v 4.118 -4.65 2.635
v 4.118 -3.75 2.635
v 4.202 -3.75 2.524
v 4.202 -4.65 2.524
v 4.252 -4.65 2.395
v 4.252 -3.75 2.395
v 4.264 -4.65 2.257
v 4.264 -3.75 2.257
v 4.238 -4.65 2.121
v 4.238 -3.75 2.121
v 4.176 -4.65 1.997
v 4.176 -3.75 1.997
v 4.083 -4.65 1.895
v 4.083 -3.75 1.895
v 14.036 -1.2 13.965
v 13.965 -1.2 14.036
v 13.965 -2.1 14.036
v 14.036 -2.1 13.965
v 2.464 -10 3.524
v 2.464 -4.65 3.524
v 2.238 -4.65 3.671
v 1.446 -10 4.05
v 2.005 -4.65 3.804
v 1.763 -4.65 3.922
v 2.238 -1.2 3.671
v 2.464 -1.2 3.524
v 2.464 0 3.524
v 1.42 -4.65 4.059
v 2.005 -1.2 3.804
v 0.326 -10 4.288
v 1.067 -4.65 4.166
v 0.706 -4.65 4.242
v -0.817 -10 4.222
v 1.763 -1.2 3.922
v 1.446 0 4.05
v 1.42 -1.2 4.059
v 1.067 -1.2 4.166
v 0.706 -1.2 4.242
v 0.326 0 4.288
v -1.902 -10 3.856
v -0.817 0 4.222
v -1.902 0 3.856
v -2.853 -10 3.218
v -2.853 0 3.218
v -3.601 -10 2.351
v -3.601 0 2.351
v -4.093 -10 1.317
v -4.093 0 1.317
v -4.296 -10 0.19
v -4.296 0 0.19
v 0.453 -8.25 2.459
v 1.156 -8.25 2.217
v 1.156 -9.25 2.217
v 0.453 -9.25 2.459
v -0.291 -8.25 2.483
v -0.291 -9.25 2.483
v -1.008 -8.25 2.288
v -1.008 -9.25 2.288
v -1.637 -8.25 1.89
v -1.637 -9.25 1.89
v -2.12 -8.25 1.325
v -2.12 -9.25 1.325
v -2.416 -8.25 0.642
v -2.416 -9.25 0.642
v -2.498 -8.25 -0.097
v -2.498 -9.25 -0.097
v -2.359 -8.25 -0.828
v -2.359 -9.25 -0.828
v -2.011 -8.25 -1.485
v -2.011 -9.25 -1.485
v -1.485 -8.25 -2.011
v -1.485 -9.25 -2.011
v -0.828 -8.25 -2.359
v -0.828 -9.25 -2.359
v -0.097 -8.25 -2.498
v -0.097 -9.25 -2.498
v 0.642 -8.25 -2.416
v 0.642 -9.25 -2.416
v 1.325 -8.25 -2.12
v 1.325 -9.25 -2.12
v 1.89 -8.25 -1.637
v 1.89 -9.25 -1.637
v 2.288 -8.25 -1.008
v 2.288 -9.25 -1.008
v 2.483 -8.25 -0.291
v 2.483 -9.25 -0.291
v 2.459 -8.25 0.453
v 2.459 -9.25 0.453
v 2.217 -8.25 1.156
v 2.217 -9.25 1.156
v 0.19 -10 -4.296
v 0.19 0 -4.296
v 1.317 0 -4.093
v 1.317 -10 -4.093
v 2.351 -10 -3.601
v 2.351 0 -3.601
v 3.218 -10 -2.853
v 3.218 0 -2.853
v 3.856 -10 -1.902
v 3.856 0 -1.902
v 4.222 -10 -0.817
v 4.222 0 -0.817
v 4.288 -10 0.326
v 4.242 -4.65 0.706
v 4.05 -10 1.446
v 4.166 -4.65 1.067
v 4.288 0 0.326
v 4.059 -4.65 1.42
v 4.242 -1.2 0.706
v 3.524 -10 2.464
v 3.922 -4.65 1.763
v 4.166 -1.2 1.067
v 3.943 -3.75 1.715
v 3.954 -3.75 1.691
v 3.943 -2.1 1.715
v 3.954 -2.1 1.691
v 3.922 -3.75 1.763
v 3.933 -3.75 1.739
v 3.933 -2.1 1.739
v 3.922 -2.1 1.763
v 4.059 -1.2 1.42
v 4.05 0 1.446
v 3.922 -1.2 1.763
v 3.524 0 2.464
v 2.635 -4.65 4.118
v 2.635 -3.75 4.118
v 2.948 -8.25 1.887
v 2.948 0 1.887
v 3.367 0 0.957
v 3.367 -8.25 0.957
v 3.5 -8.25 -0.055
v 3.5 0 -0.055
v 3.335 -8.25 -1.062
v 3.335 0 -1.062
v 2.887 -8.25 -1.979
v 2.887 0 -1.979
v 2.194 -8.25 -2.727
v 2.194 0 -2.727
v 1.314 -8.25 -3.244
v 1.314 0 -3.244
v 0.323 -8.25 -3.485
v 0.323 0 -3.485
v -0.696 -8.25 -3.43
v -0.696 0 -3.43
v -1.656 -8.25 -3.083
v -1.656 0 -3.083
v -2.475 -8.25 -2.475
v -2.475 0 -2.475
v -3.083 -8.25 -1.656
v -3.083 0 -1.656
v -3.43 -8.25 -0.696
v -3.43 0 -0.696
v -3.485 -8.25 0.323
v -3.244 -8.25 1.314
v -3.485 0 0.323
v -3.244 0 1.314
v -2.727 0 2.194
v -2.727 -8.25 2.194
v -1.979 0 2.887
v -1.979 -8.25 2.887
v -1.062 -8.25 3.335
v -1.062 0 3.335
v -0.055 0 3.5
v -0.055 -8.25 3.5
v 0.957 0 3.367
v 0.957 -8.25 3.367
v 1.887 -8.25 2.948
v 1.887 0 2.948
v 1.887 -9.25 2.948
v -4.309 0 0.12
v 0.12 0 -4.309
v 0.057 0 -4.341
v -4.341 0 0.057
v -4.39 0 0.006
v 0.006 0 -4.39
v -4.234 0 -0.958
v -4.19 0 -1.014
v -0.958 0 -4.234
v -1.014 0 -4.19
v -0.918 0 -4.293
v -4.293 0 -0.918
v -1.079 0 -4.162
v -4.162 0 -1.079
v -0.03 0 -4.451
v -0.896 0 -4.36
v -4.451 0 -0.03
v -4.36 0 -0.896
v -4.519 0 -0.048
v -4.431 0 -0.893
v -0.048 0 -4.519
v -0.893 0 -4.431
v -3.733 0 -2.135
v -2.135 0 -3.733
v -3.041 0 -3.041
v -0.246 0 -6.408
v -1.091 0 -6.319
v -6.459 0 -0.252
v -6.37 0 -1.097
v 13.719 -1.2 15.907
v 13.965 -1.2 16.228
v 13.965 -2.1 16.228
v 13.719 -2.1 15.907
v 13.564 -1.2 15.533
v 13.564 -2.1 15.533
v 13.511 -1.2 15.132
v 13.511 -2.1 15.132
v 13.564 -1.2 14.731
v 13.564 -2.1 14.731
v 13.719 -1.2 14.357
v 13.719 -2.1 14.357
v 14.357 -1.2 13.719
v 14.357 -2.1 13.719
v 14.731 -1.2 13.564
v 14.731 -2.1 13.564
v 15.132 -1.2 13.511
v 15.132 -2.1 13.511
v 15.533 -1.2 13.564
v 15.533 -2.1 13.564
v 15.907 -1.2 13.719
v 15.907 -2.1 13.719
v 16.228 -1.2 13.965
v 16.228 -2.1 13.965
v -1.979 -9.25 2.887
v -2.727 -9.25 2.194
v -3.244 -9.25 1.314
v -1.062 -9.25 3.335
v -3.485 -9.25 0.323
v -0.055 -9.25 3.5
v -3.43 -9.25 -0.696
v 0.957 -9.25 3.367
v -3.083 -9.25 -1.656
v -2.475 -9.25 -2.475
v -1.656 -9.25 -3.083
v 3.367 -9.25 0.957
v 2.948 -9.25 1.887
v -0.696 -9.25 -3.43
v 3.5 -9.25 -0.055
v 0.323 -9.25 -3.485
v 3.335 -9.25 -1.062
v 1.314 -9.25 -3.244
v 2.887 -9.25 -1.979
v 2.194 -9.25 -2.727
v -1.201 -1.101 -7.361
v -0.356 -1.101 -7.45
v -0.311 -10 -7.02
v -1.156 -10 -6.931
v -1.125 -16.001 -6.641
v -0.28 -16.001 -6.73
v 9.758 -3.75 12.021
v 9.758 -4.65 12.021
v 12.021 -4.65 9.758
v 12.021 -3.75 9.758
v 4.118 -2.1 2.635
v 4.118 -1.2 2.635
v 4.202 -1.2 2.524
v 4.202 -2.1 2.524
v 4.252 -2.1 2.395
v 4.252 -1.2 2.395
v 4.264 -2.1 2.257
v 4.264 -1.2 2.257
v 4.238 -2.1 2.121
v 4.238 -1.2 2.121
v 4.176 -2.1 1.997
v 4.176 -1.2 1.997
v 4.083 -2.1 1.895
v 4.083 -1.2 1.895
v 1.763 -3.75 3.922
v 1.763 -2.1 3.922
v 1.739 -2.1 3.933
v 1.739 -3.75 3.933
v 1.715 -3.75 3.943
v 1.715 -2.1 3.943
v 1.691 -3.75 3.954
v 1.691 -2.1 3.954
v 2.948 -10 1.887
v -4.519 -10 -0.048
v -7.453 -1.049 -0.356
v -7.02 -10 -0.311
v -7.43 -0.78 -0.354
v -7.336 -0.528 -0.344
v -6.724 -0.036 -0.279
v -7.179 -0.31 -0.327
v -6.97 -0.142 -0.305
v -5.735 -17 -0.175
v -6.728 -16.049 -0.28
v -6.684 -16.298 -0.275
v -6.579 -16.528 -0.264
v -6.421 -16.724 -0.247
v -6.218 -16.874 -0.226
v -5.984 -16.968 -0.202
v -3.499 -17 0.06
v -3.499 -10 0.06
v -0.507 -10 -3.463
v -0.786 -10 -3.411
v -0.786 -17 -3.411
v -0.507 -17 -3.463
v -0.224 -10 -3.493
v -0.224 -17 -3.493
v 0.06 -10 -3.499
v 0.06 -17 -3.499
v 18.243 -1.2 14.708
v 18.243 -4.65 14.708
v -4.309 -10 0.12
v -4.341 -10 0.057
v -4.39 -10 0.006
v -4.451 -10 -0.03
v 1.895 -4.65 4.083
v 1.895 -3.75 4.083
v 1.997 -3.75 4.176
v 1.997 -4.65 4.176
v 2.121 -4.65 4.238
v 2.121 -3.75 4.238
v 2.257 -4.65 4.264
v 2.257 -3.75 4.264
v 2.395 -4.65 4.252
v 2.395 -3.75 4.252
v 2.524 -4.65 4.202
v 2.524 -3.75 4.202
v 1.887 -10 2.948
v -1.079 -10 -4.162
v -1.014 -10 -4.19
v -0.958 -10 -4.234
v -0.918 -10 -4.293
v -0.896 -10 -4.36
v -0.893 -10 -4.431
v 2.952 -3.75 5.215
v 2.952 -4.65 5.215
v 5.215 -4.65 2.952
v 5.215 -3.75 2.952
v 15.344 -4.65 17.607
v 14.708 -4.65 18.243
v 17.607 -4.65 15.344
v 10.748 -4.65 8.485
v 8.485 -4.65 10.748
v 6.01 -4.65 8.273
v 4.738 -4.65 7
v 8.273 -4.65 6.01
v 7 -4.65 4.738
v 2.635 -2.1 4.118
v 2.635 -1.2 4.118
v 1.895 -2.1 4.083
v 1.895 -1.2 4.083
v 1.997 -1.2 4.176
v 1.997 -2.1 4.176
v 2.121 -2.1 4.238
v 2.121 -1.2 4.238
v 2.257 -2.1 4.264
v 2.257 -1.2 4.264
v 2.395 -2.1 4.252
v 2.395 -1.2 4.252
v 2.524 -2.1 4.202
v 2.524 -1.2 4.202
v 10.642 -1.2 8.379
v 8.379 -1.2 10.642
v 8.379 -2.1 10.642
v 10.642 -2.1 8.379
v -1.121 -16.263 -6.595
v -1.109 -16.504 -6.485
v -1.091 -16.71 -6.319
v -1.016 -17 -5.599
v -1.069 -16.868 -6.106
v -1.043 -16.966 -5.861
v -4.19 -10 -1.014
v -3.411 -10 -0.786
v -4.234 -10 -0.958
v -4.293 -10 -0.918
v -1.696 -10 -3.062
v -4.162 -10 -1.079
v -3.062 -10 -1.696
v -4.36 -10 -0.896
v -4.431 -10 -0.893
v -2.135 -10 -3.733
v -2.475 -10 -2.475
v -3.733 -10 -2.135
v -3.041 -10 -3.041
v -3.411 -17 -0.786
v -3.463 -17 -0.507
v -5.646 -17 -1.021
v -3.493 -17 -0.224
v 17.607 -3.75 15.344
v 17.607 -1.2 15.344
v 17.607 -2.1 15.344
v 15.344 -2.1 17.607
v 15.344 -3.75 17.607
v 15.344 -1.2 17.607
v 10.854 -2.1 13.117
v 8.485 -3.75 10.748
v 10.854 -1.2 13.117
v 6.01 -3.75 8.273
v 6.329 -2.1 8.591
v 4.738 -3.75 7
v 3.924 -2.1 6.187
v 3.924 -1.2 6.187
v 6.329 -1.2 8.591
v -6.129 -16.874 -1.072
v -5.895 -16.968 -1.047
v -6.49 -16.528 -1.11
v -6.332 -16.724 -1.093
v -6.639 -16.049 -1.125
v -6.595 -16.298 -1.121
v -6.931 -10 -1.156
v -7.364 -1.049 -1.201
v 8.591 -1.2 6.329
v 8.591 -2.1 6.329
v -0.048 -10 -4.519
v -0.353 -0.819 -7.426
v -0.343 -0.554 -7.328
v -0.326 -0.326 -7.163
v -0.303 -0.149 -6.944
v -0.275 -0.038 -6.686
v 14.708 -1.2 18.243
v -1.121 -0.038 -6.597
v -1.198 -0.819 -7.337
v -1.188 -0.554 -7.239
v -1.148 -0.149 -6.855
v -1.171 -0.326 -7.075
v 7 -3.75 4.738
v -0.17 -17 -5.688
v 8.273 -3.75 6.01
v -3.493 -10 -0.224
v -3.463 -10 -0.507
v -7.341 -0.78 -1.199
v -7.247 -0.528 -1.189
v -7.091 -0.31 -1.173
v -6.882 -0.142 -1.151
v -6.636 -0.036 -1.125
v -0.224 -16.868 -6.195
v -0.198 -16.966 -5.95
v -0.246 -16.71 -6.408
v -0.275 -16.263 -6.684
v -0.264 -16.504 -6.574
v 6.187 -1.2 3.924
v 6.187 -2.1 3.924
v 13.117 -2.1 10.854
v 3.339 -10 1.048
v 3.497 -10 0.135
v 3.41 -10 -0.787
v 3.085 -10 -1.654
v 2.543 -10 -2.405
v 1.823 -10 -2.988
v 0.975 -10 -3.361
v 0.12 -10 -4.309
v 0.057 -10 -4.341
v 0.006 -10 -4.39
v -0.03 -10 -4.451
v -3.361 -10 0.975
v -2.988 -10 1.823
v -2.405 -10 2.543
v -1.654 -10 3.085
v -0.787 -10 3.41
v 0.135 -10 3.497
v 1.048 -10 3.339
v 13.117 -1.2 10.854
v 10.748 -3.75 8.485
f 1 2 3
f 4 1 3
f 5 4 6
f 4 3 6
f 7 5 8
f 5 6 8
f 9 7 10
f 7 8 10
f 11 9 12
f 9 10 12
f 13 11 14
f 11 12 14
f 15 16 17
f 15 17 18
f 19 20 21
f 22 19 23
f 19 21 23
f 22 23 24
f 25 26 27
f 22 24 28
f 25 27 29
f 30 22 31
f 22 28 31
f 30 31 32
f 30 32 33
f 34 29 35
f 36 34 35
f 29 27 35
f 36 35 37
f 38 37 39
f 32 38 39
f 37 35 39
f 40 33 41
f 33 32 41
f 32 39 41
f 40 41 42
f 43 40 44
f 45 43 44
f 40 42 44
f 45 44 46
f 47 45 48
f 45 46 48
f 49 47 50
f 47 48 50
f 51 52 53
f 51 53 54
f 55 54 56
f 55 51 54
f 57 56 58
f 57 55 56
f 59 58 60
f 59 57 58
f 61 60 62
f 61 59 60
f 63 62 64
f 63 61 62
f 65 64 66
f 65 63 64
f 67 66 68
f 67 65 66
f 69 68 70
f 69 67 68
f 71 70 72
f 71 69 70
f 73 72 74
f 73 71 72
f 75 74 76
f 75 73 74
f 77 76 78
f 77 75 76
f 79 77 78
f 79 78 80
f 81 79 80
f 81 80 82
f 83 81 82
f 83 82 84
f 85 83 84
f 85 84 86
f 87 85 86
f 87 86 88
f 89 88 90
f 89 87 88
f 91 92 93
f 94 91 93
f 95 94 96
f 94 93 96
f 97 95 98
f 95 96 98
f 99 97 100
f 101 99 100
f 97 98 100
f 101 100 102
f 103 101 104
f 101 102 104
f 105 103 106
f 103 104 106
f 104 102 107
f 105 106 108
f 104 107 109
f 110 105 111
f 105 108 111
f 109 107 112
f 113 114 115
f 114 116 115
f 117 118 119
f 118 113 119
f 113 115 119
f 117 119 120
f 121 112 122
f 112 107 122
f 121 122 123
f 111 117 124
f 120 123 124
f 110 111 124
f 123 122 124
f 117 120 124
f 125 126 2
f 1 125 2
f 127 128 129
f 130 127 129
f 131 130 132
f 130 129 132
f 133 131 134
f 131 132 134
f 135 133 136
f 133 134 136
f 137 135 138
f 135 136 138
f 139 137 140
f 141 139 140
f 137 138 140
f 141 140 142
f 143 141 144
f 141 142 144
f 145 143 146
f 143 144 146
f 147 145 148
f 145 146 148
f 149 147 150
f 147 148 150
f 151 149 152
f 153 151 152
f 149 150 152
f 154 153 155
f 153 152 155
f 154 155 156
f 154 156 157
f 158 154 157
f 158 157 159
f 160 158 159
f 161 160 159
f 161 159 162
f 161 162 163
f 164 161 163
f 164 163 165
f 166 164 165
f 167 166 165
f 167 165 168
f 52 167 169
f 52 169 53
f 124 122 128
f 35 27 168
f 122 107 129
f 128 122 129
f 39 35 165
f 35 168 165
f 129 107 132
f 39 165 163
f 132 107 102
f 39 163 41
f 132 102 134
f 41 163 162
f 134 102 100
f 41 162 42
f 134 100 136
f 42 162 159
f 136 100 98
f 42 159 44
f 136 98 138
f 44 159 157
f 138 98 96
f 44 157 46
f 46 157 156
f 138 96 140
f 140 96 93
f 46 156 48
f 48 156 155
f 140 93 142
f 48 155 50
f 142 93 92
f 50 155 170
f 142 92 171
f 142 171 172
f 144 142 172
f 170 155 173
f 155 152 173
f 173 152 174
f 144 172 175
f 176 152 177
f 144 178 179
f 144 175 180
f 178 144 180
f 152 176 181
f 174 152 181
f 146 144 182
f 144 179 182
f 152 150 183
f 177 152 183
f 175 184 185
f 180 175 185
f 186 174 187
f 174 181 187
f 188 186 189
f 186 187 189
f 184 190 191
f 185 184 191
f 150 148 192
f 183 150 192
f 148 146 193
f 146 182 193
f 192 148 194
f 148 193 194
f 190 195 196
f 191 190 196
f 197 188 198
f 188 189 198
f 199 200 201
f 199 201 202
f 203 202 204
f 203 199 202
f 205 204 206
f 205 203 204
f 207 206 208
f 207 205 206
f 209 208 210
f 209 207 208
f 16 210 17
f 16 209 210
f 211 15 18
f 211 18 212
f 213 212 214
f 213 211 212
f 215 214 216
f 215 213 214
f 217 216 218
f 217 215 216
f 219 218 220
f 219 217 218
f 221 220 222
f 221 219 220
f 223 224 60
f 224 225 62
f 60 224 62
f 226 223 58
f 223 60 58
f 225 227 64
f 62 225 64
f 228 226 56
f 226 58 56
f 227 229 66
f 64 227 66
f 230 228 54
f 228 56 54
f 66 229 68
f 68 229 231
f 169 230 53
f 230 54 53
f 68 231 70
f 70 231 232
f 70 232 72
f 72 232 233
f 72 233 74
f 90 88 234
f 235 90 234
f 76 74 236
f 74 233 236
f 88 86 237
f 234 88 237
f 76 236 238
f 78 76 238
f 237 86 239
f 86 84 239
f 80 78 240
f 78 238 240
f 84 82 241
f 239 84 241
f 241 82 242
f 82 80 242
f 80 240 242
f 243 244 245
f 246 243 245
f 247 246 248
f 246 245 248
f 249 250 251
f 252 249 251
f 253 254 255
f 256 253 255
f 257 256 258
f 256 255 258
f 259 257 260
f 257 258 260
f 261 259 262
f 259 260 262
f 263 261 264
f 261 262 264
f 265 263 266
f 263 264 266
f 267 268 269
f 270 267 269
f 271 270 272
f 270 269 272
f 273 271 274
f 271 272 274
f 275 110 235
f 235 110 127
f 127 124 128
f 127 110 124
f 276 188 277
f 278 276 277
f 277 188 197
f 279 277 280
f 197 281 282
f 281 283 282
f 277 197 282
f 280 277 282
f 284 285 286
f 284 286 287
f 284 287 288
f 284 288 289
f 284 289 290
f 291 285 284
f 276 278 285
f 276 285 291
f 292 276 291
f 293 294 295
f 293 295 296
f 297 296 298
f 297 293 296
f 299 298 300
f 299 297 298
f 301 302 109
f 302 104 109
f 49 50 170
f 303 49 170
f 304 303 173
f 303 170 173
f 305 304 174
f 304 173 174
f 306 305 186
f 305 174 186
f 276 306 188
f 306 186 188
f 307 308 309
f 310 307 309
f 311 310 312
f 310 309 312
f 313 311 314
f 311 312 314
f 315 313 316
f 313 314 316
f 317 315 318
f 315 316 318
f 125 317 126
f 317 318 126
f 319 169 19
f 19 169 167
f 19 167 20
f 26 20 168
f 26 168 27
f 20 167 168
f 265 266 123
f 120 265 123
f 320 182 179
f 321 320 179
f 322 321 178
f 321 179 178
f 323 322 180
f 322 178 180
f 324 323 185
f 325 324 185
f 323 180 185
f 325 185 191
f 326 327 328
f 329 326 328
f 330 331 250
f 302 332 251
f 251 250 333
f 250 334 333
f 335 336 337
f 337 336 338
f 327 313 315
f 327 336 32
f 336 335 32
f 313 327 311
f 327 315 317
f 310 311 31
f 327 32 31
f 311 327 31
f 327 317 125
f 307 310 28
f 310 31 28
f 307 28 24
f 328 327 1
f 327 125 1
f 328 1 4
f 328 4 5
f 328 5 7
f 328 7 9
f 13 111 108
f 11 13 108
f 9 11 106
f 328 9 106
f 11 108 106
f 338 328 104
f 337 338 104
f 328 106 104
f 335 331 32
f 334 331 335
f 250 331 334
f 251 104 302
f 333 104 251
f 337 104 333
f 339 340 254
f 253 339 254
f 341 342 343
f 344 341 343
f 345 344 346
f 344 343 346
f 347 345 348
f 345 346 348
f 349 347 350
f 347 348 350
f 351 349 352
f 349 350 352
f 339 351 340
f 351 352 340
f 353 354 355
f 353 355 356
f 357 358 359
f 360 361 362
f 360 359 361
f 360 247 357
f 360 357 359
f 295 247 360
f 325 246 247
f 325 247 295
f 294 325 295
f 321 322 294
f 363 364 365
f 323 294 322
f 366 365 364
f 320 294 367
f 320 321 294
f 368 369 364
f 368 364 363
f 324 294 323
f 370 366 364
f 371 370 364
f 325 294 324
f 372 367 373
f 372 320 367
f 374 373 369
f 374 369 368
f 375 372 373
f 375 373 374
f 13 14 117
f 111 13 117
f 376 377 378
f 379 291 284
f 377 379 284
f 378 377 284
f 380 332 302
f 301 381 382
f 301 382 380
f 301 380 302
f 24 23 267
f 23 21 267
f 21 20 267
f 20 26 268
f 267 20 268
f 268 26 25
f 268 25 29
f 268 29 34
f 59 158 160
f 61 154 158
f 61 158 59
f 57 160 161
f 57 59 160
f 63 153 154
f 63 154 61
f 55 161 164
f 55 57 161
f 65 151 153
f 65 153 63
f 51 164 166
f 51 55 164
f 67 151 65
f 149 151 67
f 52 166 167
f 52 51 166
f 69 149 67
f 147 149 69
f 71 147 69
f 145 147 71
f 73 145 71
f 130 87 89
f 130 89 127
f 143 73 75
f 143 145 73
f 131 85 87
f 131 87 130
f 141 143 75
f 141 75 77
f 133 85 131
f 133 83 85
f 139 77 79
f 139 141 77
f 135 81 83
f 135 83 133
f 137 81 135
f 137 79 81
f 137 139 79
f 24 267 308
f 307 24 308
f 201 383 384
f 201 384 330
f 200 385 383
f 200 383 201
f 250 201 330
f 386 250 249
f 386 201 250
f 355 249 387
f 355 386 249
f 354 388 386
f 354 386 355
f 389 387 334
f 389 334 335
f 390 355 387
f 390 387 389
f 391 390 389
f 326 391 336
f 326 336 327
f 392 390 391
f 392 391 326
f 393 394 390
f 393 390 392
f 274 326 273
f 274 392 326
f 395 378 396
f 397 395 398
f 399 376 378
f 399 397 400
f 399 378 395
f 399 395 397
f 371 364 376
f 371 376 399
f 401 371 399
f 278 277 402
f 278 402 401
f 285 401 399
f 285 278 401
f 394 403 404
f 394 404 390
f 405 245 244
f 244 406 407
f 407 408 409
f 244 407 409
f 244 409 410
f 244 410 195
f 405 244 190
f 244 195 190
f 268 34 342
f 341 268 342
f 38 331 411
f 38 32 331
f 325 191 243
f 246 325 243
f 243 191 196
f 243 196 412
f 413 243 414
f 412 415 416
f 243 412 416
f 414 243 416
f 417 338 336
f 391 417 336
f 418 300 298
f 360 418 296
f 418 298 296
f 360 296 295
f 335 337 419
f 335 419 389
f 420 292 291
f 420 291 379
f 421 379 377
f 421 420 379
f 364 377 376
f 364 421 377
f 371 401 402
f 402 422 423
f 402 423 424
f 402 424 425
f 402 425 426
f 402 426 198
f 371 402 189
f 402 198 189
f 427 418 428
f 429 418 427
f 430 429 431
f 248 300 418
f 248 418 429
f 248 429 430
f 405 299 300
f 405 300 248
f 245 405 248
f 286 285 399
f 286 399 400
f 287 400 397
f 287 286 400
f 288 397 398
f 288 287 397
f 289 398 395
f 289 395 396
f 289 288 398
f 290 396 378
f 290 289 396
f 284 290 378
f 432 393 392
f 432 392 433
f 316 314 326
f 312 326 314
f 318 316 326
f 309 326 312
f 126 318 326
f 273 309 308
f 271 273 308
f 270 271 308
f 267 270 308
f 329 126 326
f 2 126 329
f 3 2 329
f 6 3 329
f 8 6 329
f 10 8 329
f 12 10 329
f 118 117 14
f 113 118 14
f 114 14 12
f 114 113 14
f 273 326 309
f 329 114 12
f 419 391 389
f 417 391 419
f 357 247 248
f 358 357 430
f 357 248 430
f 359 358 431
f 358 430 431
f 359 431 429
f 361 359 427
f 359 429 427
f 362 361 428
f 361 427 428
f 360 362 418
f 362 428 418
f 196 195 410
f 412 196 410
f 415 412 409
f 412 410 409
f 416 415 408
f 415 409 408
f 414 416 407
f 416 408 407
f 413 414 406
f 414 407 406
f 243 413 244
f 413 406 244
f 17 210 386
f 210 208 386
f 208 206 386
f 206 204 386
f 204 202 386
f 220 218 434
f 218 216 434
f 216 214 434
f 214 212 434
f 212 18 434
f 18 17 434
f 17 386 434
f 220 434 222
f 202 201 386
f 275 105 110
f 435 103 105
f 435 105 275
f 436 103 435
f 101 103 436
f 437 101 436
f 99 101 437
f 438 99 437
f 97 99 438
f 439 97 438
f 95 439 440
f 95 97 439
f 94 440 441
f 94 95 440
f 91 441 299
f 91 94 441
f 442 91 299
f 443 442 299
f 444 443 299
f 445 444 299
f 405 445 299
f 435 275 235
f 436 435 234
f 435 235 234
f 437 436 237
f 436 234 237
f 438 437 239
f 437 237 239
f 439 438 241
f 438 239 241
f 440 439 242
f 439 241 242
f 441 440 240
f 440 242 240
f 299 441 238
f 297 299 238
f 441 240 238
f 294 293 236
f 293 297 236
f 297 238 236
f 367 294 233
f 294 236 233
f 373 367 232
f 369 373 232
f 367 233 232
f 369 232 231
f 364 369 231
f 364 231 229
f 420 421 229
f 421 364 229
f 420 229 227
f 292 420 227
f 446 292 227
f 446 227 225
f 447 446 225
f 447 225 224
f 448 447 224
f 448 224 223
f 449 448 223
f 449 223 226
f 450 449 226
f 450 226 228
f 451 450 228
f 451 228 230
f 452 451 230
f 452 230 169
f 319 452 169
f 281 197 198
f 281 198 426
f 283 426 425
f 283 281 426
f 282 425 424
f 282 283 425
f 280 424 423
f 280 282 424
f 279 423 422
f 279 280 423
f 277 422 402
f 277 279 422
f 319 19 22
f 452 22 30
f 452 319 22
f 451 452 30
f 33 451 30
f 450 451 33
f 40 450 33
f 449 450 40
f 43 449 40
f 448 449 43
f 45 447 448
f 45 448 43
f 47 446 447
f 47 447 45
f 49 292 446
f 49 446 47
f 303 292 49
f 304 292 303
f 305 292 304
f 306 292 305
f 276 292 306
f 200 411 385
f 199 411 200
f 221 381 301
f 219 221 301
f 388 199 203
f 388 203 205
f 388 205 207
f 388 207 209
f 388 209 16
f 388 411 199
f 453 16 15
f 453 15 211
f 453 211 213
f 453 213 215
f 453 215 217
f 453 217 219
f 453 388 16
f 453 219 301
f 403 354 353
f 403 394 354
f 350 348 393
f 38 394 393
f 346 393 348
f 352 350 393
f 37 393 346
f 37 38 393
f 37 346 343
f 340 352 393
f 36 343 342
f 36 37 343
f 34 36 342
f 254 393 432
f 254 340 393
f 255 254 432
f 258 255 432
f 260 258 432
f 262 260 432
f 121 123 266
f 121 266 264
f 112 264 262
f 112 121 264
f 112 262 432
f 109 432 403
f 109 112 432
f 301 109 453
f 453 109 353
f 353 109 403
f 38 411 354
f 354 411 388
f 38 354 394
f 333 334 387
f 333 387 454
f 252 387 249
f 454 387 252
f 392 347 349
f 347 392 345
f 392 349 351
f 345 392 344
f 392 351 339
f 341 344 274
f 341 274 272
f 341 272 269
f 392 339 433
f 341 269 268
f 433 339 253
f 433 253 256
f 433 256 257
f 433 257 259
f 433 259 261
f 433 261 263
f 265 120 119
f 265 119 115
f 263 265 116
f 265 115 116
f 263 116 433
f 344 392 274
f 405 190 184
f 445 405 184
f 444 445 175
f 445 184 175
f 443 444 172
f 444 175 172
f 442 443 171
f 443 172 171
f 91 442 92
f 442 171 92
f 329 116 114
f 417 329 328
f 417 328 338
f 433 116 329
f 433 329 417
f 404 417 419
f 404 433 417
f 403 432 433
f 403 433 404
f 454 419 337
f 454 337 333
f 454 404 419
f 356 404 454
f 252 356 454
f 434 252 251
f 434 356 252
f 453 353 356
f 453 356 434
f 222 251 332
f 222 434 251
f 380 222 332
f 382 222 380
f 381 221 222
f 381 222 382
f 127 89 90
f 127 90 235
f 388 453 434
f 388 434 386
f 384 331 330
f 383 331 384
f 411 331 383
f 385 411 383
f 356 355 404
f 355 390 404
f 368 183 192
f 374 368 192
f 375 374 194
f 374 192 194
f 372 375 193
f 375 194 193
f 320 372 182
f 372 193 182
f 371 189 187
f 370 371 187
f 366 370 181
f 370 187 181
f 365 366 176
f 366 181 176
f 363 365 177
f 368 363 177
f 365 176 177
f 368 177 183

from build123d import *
from build123d.topology import SkipClean

# Parameters (mm, degrees)
BOSS_EXTRUDE1_DEPTH             = 10
BOSS_EXTRUDE2_DEPTH             = 1
BOSS_EXTRUDE3_DEPTH             = 7
CUT_EXTRUDE1_REACH              = 22.186
CUT_EXTRUDE2_REACH              = 22.166
BOSS_EXTRUDE4_REACH             = 24.566
BOSS_EXTRUDE4_END_RADIUS        = 3.5
SKETCH6_W                       = 5
SKETCH6_H                       = 3.45
SKETCH6_W_2                     = 3.2
SKETCH6_H_2                     = 1.65
BOSS_EXTRUDE4_DIRECTION_2_DEPTH = 19
CUT_EXTRUDE3_REACH              = 32.254
CUT_EXTRUDE4_REACH              = 32.254
CUT_EXTRUDE5_REACH              = 30.604


with BuildPart() as part:
    # Sketch1 → Boss-Extrude1 (new body)
    with BuildSketch(Plane(origin=(0, 0, 0), x_dir=(1, 0, 0), z_dir=(0, 1, 0))):
        with BuildLine():
            Line((-7.414489618, 1.20663528), (-4.430578599, 0.893013594))
            ThreePointArc((-4.430578599, 0.893013594), (-4.262003609, 0.936193276), (-4.162443929, 1.078916372))
            ThreePointArc((-4.162443929, 1.078916372), (-3.040559159, 3.040559159), (-1.078916372, 4.162443929))
            ThreePointArc((-1.078916372, 4.162443929), (-0.936193276, 4.262003609), (-0.893013594, 4.430578599))
            Line((-0.893013594, 4.430578599), (-1.20663528, 7.414489618))
            Line((-1.20663528, 7.414489618), (-0.361291669, 7.503338812))
            Line((-0.361291669, 7.503338812), (-0.047669983, 4.519427793))
            ThreePointArc((-0.047669983, 4.519427793), (0.02961483, 4.363514132), (0.189918705, 4.29580387))
            ThreePointArc((0.189918705, 4.29580387), (3.856330167, 1.902292734), (3.524282323, -2.463622152))
            Line((3.524282323, -2.463622152), (2.947715037, -1.887054865))
            ThreePointArc((2.947715037, -1.887054865), (-2.474873734, 2.474873734), (1.887054865, -2.947715037))
            Line((1.887054865, -2.947715037), (2.463622152, -3.524282323))
            ThreePointArc((2.463622152, -3.524282323), (-1.902292734, -3.856330167), (-4.29580387, -0.189918705))
            ThreePointArc((-4.29580387, -0.189918705), (-4.363514132, -0.02961483), (-4.519427793, 0.047669983))
            Line((-4.519427793, 0.047669983), (-7.503338812, 0.361291669))
            Line((-7.503338812, 0.361291669), (-7.414489618, 1.20663528))
        make_face()
    extrude(amount=-BOSS_EXTRUDE1_DEPTH)

    # Sketch2 → Boss-Extrude2 (add)
    with BuildSketch(Plane(origin=(0, -8.25, 0), x_dir=(-1, 0, 0), z_dir=(0, -1, 0))):
        with BuildLine():
            Line((-1.887054865, -2.947715037), (-1.15601211, -2.216672281))
            ThreePointArc((-1.15601211, -2.216672281), (1.767766953, 1.767766953), (-2.216672281, -1.15601211))
            Line((-2.216672281, -1.15601211), (-2.947715037, -1.887054865))
            ThreePointArc((-2.947715037, -1.887054865), (2.474873734, 2.474873734), (-1.887054865, -2.947715037))
        make_face()
    extrude(amount=BOSS_EXTRUDE2_DEPTH)

    # Sketch3 → Boss-Extrude3 (add)
    with SkipClean():  # the faces are left unmerged after this step: merging them gives an invalid solid
        with BuildSketch(Plane.XZ.offset(10)):
            with BuildLine():
                Line((-7.503338812, -0.361291669), (-3.499493713, 0.059529408))
                ThreePointArc((-3.499493713, 0.059529408), (-3.480826634, -0.365849621), (-3.41064452, -0.785814203))
                Line((-3.41064452, -0.785814203), (-7.414489618, -1.20663528))
                Line((-7.414489618, -1.20663528), (-7.503338812, -0.361291669))
            make_face()
            with BuildLine():
                Line((-1.20663528, -7.414489618), (-0.785814203, -3.41064452))
                ThreePointArc((-0.785814203, -3.41064452), (-0.365849621, -3.480826634), (0.059529408, -3.499493713))
                Line((0.059529408, -3.499493713), (-0.361291669, -7.503338812))
                Line((-0.361291669, -7.503338812), (-1.20663528, -7.414489618))
            make_face()
        extrude(amount=BOSS_EXTRUDE3_DEPTH)

    # Sketch4 → Cut-Extrude1 (cut, up to next)
    with BuildSketch(Plane(origin=(-0.044424597, 0, 0.422671806), x_dir=(0.9945218953682731, 0, 0.10452846326765693), z_dir=(-0.10452846326765693, 0, 0.9945218953682731)), mode=Mode.PRIVATE) as cut_extrude1_sk1:
        with BuildLine():
            Line((-4.499652764, 0), (-6.450238257, 0))
            ThreePointArc((-6.450238257, 0), (-7.174298022, -0.310262762), (-7.449060221, -1.048525086))
            Line((-7.449060221, -1.048525086), (-6.720325459, -16.048525086))
            ThreePointArc((-6.720325459, -16.048525086), (-6.411240733, -16.724059765), (-5.721503495, -17))
            Line((-5.721503495, -17), (-3.474100603, -17))
            Line((-3.474100603, -17), (-3.474100603, -18.237576525))
            Line((-3.474100603, -18.237576525), (-8.636241127, -18.237576525))
            Line((-8.636241127, -18.237576525), (-8.636241127, 0.642542217))
            Line((-8.636241127, 0.642542217), (-4.499652764, 0.642542217))
            Line((-4.499652764, 0.642542217), (-4.499652764, 0))
        make_face()
    cut_extrude1_tool1 = extrude(cut_extrude1_sk1.sketch, amount=-CUT_EXTRUDE1_REACH, mode=Mode.PRIVATE) & part.part
    add(cut_extrude1_tool1.solids().sort_by_distance((-7.422183, -10.016233, -0.352762))[0], mode=Mode.SUBTRACT)

    # Sketch5 → Cut-Extrude2 (cut, up to next)
    with BuildSketch(Plane(origin=(0.422671806, 0, -0.044424597), x_dir=(-0.10452846326764693, 0, -0.9945218953682741), z_dir=(0.9945218953682741, 0, -0.10452846326764693)), mode=Mode.PRIVATE) as cut_extrude2_sk1:
        with BuildLine():
            Line((4.499652764, 0), (6.39817036, 0))
            ThreePointArc((6.39817036, 0), (7.158143292, -0.325651711), (7.446533622, -1.100531645))
            Line((7.446533622, -1.100531645), (6.7226182, -16.001332189))
            ThreePointArc((6.7226182, -16.001332189), (6.398202955, -16.710373204), (5.674254938, -17))
            Line((5.674254938, -17), (3.474100603, -17))
            Line((3.474100603, -17), (3.474100603, -17.961134023))
            Line((3.474100603, -17.961134023), (9.689471059, -17.961134023))
            Line((9.689471059, -17.961134023), (9.520710585, 0.644708136))
            Line((9.520710585, 0.644708136), (4.499652764, 0.644708136))
            Line((4.499652764, 0.644708136), (4.499652764, 0))
        make_face()
    cut_extrude2_tool1 = extrude(cut_extrude2_sk1.sketch, amount=-CUT_EXTRUDE2_REACH, mode=Mode.PRIVATE) & part.part
    add(cut_extrude2_tool1.solids().sort_by_distance((-0.417746, -9.418745, -8.040463))[0], mode=Mode.SUBTRACT)

    # Boss-Extrude4: up to this cylinder (the profile starts outside it)
    with SkipClean():  # the faces are left unmerged after this step: merging them gives an invalid solid
        boss_extrude4_end = Plane(origin=(0, -1.260747, 0), z_dir=(0, 1, 0)) * Cylinder(BOSS_EXTRUDE4_END_RADIUS, 57.132, mode=Mode.PRIVATE)
        # Sketch6 → Boss-Extrude4 (add, up to the surface)
        with BuildSketch(Plane(origin=(3.040559159, 0, 3.040559159), x_dir=(0.7071067811865511, 0, -0.707106781186544), z_dir=(0.707106781186544, 0, 0.7071067811865511)), mode=Mode.PRIVATE) as boss_extrude4_sk1:
            with Locations((0, -2.925)):
                Rectangle(SKETCH6_W, SKETCH6_H)
            with Locations((0, -2.925)):
                Rectangle(SKETCH6_W_2, SKETCH6_H_2, mode=Mode.SUBTRACT)
        boss_extrude4_tool1 = extrude(boss_extrude4_sk1.sketch, amount=-BOSS_EXTRUDE4_REACH, mode=Mode.PRIVATE) - boss_extrude4_end
        add(boss_extrude4_tool1.solids().sort_by_distance((3.040559, -1.260747, 3.040559))[0])

    # Sketch6 → Boss-Extrude4 direction 2 (add)
    with SkipClean():  # the faces are left unmerged after this step: merging them gives an invalid solid
        with BuildSketch(Plane(origin=(3.040559159, 0, 3.040559159), x_dir=(0.7071067811865511, 0, -0.707106781186544), z_dir=(0.707106781186544, 0, 0.7071067811865511))):
            with Locations((0, -2.925)):
                Rectangle(SKETCH6_W, SKETCH6_H)
            with Locations((0, -2.925)):
                Rectangle(SKETCH6_W_2, SKETCH6_H_2, mode=Mode.SUBTRACT)
        extrude(amount=BOSS_EXTRUDE4_DIRECTION_2_DEPTH)

    # Sketch7 → Cut-Extrude3 (cut, up to next)
    with BuildSketch(Plane(origin=(0, -1.2, 0), x_dir=(1, 0, 0), z_dir=(0, 1, 0)), mode=Mode.PRIVATE) as cut_extrude3_sk1:
        with BuildLine():
            Line((15.344217152, -17.606958852), (13.965358928, -16.228100628))
            ThreePointArc((13.965358928, -16.228100628), (13.511374439, -15.132085117), (13.965358928, -14.036069607))
            Line((13.965358928, -14.036069607), (14.036069607, -13.965358928))
            ThreePointArc((14.036069607, -13.965358928), (15.132085117, -13.511374439), (16.228100628, -13.965358928))
            Line((16.228100628, -13.965358928), (17.606958852, -15.344217152))
            Line((17.606958852, -15.344217152), (15.344217152, -17.606958852))
        make_face()
    cut_extrude3_tool1 = extrude(cut_extrude3_sk1.sketch, amount=-CUT_EXTRUDE3_REACH, mode=Mode.PRIVATE) & part.part
    # Sketch7 → Cut-Extrude3 (cut, up to next)
    with BuildSketch(Plane(origin=(0, -1.2, 0), x_dir=(1, 0, 0), z_dir=(0, 1, 0)), mode=Mode.PRIVATE) as cut_extrude3_sk2:
        Polygon((8.379215357, -10.641957057), (10.641957057, -8.379215357), (13.116830791, -10.854089091), (10.854089091, -13.116830791), align=None)
    cut_extrude3_tool2 = extrude(cut_extrude3_sk2.sketch, amount=-CUT_EXTRUDE3_REACH, mode=Mode.PRIVATE) & part.part
    # Sketch7 → Cut-Extrude3 (cut, up to next)
    with BuildSketch(Plane(origin=(0, -1.2, 0), x_dir=(1, 0, 0), z_dir=(0, 1, 0)), mode=Mode.PRIVATE) as cut_extrude3_sk3:
        Polygon((3.924442636, -6.187184335), (6.187184335, -3.924442636), (8.591347391, -6.328605692), (6.328605692, -8.591347391), align=None)
    cut_extrude3_tool3 = extrude(cut_extrude3_sk3.sketch, amount=-CUT_EXTRUDE3_REACH, mode=Mode.PRIVATE) & part.part
    add(cut_extrude3_tool1.solids().sort_by_distance((15.338807, -1.2, 15.338807))[0], mode=Mode.SUBTRACT)
    add(cut_extrude3_tool2.solids().sort_by_distance((10.748023, -1.2, 10.748023))[0], mode=Mode.SUBTRACT)
    add(cut_extrude3_tool3.solids().sort_by_distance((6.257895, -1.2, 6.257895))[0], mode=Mode.SUBTRACT)

    # Cut-Extrude4: up to this face of the body (flat: up to its plane)
    cut_extrude4_end = Plane(part.part.faces().sort_by_distance((9.75807358, -4.65, 9.75807358))[0])
    # Sketch8 → Cut-Extrude4 (cut, up to the picked face)
    with BuildSketch(Plane(origin=(0, -1.2, 0), x_dir=(1, 0, 0), z_dir=(0, 1, 0)), mode=Mode.PRIVATE) as cut_extrude4_sk1:
        with BuildLine():
            Line((1.887054865, -2.947715037), (2.463622152, -3.524282323))
            ThreePointArc((2.463622152, -3.524282323), (2.122539393, -3.739629196), (1.762778319, -3.922067388))
            Line((1.762778319, -3.922067388), (1.894971957, -4.082617205))
            ThreePointArc((1.894971957, -4.082617205), (2.256834016, -4.264215104), (2.634518611, -4.118351149))
            Line((2.634518611, -4.118351149), (4.118351149, -2.634518611))
            ThreePointArc((4.118351149, -2.634518611), (4.264215104, -2.256834016), (4.082617205, -1.894971957))
            Line((4.082617205, -1.894971957), (3.922067388, -1.762778319))
            ThreePointArc((3.922067388, -1.762778319), (3.739629196, -2.122539393), (3.524282323, -2.463622152))
            Line((3.524282323, -2.463622152), (2.947715037, -1.887054865))
            ThreePointArc((2.947715037, -1.887054865), (2.474873734, -2.474873734), (1.887054865, -2.947715037))
        make_face()
    cut_extrude4_tool1 = split(extrude(cut_extrude4_sk1.sketch, amount=-CUT_EXTRUDE4_REACH, mode=Mode.PRIVATE), bisect_by=cut_extrude4_end, keep=Keep.BOTH, mode=Mode.PRIVATE)
    add(cut_extrude4_tool1.solids().sort_by(Axis((2.984609, -1.2, 2.984609), (0, -1, 0)))[0], mode=Mode.SUBTRACT)

    # Sketch9 → Cut-Extrude5 (cut, up to next)
    with BuildSketch(Plane.XZ.offset(4.65), mode=Mode.PRIVATE) as cut_extrude5_sk1:
        Polygon((9.75807358, 12.02081528), (12.02081528, 9.75807358), (17.606958852, 15.344217152), (15.344217152, 17.606958852), align=None)
    cut_extrude5_tool1 = extrude(cut_extrude5_sk1.sketch, amount=-CUT_EXTRUDE5_REACH, mode=Mode.PRIVATE) & part.part
    # Sketch9 → Cut-Extrude5 (cut, up to next)
    with BuildSketch(Plane.XZ.offset(4.65), mode=Mode.PRIVATE) as cut_extrude5_sk2:
        Polygon((8.485281374, 10.748023074), (10.748023074, 8.485281374), (8.27314934, 6.01040764), (6.01040764, 8.27314934), align=None)
    cut_extrude5_tool2 = extrude(cut_extrude5_sk2.sketch, amount=-CUT_EXTRUDE5_REACH, mode=Mode.PRIVATE) & part.part
    # Sketch9 → Cut-Extrude5 (cut, up to next)
    with BuildSketch(Plane.XZ.offset(4.65), mode=Mode.PRIVATE) as cut_extrude5_sk3:
        Polygon((2.952170811, 5.214912511), (5.214912511, 2.952170811), (7.000357134, 4.737615434), (4.737615434, 7.000357134), align=None)
    cut_extrude5_tool3 = extrude(cut_extrude5_sk3.sketch, amount=-CUT_EXTRUDE5_REACH, mode=Mode.PRIVATE) & part.part
    add(cut_extrude5_tool1.solids().sort_by_distance((13.682516, -4.65, 13.682516))[0], mode=Mode.SUBTRACT)
    add(cut_extrude5_tool2.solids().sort_by_distance((8.379215, -4.65, 8.379215))[0], mode=Mode.SUBTRACT)
    add(cut_extrude5_tool3.solids().sort_by_distance((4.976264, -4.65, 4.976264))[0], mode=Mode.SUBTRACT)


solid = part.part
